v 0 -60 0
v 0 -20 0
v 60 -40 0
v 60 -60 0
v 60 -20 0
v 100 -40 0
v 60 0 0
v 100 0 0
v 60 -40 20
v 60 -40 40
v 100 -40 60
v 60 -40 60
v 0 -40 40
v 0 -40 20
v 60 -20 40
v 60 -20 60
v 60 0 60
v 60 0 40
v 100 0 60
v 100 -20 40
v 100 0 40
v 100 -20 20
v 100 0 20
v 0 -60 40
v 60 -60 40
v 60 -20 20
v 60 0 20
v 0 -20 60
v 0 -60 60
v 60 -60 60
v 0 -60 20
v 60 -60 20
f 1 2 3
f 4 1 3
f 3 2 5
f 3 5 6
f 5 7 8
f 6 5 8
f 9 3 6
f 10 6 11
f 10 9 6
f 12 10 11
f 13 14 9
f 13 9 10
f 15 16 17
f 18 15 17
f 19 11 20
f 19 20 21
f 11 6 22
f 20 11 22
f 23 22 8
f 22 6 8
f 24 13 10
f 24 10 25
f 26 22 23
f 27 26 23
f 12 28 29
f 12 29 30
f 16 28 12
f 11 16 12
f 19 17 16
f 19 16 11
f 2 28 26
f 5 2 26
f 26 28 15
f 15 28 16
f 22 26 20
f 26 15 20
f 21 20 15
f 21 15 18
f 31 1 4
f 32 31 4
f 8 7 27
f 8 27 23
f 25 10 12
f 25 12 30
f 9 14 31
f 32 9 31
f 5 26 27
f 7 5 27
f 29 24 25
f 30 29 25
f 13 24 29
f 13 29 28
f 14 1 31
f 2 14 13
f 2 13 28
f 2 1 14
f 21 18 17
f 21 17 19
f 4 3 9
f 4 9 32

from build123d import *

# Parameters (mm, degrees)
F0_W     = 100
F0_H     = 60
F1_DEPTH = 60
F2_W     = 40
F2_H     = 20
F3_DEPTH = 60.001
F4_W     = 20
F4_H     = 20
F5_DEPTH = 100.001
F6_W     = 60
F6_H     = 20
F7_DEPTH = 60.001
F8_W     = 20
F8_H     = 20
F9_DEPTH = 100.001


with BuildPart() as f1:
    # F0 (on Top) → F1 (new body)
    with BuildSketch(Plane.XY):
        with Locations((50, -30)):
            Rectangle(F0_W, F0_H)
    extrude(amount=F1_DEPTH)

    # F2 (on face) → F3 (cut, through all)
    with BuildSketch(Plane(origin=(0, 0, 0), x_dir=(1, 0, 0), z_dir=(0, 0, -1))):
        with Locations((80, 50)):
            Rectangle(F2_W, F2_H)
    extrude(amount=-F3_DEPTH, mode=Mode.SUBTRACT)

    # F4 (on face) → F5 (cut, through all)
    with BuildSketch(Plane.YZ.offset(100)):
        with Locations((-10, 30)):
            Rectangle(F4_W, F4_H)
    extrude(amount=-F5_DEPTH, mode=Mode.SUBTRACT)

    # F6 (on face) → F7 (cut, through all)
    with BuildSketch(Plane.XY.offset(60)):
        with Locations((30, -10)):
            Rectangle(F6_W, F6_H)
    extrude(amount=-F7_DEPTH, mode=Mode.SUBTRACT)

    # F8 (on face) → F9 (cut, through all)
    with BuildSketch(Plane(origin=(0, 0, 0), x_dir=(0, -1, 0), z_dir=(-1, 0, 0))):
        with Locations((50, 30)):
            Rectangle(F8_W, F8_H)
    extrude(amount=-F9_DEPTH, mode=Mode.SUBTRACT)


solid = f1.part
